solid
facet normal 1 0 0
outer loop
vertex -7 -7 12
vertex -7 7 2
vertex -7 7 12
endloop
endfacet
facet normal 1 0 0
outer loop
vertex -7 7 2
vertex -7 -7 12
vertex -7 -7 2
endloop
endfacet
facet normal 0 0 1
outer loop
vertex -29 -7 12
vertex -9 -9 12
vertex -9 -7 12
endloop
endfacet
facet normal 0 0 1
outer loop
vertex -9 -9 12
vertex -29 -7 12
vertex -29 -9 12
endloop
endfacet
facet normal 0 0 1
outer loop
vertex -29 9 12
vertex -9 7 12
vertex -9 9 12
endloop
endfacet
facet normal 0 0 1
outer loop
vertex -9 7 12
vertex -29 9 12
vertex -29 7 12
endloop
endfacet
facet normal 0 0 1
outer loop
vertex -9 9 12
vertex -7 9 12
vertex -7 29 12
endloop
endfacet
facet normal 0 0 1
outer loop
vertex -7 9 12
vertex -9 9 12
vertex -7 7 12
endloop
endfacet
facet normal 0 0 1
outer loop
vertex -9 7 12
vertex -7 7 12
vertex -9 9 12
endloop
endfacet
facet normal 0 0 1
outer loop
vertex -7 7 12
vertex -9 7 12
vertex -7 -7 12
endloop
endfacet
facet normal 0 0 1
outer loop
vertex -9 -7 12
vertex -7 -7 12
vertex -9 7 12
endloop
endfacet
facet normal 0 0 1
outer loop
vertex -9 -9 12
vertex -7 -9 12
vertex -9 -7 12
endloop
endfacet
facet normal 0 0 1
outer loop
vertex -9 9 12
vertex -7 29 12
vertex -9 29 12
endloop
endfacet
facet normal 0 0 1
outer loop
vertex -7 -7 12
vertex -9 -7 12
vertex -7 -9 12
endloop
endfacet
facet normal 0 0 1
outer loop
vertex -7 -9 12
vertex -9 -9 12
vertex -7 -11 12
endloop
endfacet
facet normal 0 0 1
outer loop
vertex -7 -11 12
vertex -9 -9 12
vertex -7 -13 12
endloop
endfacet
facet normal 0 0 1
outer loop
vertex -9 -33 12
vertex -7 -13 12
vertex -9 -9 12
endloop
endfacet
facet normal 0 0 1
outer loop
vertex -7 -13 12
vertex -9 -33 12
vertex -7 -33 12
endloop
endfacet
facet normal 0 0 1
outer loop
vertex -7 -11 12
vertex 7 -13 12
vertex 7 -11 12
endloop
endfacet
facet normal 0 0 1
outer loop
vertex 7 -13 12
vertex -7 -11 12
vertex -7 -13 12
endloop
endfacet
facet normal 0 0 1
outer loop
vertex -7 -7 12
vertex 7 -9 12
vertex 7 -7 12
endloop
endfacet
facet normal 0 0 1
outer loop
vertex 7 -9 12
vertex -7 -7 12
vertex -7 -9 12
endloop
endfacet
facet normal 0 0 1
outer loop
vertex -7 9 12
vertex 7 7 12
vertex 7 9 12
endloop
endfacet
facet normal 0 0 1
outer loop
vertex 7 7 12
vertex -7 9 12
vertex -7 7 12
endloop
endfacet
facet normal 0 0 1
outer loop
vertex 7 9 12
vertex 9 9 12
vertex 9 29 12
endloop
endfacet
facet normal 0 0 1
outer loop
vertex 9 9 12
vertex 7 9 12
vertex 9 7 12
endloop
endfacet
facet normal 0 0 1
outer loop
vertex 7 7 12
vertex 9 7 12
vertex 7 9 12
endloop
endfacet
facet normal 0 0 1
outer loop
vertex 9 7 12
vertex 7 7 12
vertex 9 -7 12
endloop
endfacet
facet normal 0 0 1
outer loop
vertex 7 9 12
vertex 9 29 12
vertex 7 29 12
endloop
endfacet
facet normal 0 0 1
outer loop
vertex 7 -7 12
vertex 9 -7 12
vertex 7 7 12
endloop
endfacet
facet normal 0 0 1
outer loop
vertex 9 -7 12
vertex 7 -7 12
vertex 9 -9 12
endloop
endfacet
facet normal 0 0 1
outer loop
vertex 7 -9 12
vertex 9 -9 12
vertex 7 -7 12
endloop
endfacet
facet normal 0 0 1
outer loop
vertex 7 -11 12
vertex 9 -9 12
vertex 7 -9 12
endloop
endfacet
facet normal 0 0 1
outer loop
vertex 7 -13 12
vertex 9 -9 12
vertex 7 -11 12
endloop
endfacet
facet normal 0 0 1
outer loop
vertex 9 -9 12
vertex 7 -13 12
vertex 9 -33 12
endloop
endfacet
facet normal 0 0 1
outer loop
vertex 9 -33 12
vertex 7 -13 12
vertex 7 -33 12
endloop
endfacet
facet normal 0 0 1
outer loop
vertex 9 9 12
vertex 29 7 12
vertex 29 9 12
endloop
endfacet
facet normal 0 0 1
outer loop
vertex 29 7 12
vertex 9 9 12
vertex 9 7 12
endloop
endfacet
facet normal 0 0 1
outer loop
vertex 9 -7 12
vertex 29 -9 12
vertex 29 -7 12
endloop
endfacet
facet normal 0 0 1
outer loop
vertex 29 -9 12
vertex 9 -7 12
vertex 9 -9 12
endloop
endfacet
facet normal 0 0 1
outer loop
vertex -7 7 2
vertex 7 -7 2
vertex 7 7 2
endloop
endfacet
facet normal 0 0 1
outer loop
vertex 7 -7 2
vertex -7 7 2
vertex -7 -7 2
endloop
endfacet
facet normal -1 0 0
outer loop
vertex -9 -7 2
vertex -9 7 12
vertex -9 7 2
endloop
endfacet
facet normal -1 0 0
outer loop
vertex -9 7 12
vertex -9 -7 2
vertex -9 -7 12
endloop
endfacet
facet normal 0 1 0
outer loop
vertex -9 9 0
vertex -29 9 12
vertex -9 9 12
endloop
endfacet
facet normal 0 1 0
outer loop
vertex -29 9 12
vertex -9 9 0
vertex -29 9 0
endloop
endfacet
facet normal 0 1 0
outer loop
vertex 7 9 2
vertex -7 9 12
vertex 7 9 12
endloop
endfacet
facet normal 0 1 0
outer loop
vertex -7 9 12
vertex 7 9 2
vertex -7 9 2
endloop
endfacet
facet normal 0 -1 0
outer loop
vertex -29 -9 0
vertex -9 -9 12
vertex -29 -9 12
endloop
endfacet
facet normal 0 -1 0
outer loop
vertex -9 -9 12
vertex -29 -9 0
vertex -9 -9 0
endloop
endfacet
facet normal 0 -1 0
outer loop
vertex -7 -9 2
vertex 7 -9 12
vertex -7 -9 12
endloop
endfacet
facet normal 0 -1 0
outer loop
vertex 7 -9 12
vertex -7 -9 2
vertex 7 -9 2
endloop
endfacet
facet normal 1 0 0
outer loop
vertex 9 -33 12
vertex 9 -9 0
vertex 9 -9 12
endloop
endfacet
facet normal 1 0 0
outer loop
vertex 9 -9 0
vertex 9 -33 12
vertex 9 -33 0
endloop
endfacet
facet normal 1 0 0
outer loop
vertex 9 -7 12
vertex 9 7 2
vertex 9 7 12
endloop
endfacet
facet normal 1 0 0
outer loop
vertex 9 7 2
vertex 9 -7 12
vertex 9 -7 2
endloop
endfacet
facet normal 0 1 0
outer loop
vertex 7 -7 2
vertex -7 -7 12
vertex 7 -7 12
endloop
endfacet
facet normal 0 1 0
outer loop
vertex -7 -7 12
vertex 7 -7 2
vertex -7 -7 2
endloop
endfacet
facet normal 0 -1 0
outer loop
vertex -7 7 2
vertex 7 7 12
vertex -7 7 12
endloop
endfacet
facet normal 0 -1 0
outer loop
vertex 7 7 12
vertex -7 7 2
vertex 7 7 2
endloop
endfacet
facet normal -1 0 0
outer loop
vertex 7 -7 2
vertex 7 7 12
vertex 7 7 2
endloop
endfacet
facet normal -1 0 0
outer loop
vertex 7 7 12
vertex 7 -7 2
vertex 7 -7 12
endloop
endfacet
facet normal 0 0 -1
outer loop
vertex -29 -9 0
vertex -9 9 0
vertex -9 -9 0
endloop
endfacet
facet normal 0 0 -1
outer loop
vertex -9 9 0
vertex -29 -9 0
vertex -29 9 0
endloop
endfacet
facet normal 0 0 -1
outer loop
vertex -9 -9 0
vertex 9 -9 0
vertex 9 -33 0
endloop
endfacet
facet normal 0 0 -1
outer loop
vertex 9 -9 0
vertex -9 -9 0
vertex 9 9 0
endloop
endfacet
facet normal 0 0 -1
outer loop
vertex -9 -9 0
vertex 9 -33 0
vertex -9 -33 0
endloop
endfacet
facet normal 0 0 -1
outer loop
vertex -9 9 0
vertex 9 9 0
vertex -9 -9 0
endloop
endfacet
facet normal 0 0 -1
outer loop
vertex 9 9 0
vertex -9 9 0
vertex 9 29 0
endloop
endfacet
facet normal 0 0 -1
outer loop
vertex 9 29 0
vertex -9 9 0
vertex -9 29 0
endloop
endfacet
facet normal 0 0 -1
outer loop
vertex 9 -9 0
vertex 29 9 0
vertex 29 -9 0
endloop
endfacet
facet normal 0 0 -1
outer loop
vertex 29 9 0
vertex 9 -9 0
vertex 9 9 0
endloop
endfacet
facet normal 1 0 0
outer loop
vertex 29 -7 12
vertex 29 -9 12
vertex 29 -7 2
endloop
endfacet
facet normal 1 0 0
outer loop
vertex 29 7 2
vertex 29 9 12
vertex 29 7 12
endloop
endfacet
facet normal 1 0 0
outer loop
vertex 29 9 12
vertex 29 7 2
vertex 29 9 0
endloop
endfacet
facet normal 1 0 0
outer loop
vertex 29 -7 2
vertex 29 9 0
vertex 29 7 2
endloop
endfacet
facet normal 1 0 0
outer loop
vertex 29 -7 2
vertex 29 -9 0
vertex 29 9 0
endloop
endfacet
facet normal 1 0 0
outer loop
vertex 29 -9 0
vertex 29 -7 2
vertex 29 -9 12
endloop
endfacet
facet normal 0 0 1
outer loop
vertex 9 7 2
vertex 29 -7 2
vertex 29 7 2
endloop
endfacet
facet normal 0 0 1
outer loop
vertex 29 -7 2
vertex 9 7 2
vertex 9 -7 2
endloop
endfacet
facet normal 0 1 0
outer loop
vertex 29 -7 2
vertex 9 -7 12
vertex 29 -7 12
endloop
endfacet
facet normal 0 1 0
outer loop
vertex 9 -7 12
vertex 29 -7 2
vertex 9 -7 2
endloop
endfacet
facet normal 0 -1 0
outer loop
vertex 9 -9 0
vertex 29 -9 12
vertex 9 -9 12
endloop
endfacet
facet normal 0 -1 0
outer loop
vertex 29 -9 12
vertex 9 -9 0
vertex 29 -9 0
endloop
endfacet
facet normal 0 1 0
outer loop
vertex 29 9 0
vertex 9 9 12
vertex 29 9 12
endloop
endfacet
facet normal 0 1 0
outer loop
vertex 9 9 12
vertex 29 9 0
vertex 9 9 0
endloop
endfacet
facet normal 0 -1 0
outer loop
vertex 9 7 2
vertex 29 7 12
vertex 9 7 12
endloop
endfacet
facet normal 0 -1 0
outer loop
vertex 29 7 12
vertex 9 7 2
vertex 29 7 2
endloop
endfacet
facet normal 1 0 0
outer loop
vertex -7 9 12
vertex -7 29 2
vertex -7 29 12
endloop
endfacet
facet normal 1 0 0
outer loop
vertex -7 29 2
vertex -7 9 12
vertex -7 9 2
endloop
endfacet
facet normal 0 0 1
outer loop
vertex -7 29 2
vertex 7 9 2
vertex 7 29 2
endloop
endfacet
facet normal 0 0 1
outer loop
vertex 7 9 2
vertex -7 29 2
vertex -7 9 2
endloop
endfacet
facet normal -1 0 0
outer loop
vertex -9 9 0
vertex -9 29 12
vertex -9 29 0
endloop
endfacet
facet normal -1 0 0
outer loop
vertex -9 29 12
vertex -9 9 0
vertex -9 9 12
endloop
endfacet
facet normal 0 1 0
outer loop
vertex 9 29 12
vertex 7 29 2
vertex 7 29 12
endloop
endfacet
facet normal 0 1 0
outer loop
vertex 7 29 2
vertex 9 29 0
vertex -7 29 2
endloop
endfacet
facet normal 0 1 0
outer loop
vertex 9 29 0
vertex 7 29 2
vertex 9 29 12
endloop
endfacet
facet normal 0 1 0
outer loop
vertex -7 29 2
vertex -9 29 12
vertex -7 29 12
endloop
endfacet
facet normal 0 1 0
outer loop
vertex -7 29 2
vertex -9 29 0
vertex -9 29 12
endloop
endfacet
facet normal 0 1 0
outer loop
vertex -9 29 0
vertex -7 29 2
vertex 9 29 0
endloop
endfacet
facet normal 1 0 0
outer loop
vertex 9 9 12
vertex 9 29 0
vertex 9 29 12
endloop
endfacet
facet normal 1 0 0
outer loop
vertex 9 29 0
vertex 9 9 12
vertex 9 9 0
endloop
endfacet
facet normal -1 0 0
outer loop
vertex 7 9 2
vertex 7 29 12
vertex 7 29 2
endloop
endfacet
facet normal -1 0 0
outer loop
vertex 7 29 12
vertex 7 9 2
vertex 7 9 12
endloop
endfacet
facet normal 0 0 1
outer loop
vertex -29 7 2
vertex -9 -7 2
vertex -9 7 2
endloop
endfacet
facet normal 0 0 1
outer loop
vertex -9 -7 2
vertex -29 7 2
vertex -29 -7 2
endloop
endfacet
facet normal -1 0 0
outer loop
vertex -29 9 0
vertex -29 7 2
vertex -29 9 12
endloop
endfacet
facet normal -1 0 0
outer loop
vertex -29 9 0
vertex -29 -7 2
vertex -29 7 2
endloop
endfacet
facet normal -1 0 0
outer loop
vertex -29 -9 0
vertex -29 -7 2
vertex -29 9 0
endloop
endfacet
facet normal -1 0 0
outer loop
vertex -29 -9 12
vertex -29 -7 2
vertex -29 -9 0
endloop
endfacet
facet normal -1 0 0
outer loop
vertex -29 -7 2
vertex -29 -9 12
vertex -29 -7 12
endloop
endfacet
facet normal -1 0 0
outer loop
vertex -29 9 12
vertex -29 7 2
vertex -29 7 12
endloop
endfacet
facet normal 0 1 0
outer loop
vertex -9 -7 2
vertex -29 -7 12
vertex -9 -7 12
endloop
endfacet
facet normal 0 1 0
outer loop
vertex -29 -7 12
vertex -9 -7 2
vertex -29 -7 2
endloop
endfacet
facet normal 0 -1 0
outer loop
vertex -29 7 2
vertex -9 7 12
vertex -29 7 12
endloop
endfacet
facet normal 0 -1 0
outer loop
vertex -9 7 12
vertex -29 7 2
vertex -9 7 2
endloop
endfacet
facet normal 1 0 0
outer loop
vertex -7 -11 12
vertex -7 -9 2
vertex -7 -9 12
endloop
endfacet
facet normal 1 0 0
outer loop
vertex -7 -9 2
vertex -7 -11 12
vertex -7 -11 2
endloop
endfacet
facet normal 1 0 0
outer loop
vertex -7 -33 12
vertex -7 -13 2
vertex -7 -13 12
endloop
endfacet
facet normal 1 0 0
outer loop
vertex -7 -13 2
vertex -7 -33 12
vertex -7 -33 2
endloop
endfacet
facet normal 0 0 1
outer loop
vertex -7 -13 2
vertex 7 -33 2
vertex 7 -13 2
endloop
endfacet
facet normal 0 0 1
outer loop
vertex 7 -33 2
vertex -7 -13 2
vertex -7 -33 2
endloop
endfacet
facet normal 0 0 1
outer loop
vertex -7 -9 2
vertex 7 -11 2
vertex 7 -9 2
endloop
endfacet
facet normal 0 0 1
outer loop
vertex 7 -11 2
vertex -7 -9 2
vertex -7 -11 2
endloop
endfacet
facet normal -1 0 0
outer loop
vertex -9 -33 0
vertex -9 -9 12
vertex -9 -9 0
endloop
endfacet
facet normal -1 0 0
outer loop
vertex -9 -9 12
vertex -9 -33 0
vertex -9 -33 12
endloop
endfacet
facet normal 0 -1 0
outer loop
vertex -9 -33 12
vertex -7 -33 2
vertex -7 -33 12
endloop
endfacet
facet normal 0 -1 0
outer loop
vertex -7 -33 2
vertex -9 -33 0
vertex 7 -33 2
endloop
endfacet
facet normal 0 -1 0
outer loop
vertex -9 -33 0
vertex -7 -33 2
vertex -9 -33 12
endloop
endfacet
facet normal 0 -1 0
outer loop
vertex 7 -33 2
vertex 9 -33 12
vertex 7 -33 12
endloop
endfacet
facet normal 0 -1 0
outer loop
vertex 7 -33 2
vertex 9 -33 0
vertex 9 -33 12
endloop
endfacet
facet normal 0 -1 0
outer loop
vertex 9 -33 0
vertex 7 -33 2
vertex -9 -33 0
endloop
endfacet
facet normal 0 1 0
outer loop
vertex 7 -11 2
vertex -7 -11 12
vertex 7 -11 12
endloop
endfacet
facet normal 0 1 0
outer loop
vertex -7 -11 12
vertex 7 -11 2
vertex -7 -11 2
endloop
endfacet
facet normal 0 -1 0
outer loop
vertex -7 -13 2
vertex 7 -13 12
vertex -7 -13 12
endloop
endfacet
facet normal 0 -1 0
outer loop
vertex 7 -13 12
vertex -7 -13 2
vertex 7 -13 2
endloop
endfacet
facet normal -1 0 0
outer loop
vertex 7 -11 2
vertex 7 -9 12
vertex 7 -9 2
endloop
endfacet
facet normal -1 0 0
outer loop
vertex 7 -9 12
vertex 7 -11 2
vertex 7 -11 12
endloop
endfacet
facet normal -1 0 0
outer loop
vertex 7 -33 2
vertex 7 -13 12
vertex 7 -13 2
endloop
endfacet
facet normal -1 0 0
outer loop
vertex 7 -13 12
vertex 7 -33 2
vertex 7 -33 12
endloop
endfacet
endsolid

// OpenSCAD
thickness=2;
width=14;
padding=0;
height=10;
extrusion=20;
gap=4;

m_padding=padding;
t_width=width;
t_padding=padding;
b_width=width;
b_padding=padding;

//m_padding=6;
//t_width=10;
//t_padding=6;
//b_width=width;
//b_padding=6;

r_do = true;
t_do = true;
l_do = true;
b_do = true;


align=(width+2*thickness)/2;

t_align=(t_width+2*thickness)/2;
b_align=(b_width+2*thickness)/2;

// MIDDLE
translate([-align,-align, 0]) {
    cube([width+2*thickness,width+2*thickness,thickness+m_padding]);

    translate([0,0,thickness]) {
        cube([thickness, width+2*thickness, height+m_padding]);

        cube([width+2*thickness, thickness, height+m_padding]);

        translate([0,width+thickness,0])
        cube([width+2*thickness, thickness, height+m_padding]);

        translate([width+thickness,0,0])
        cube([thickness, width+2*thickness, height+m_padding]);
    }
};

// RIGHT
if (r_do)
translate([width+2*thickness-align,0-align,0])
union() {
    cube([extrusion,width+2*thickness,thickness+padding]);
    translate([0,0,thickness]) {
        cube([extrusion, thickness, height+padding]);

        translate([0,width+thickness,0])
        cube([extrusion, thickness, height+padding]);
    }
}

// TOP
if (t_do)
translate([0-t_align,width+2*thickness-align,0])
union() {
    cube([t_width+2*thickness,extrusion,thickness+t_padding]);
    translate([0,0,thickness]) {
        cube([thickness, extrusion, height+t_padding]);

        translate([t_width+thickness,0,0])
        cube([thickness, extrusion, height+t_padding]);
    }
}

// LEFT
if (l_do)
translate([-extrusion-align,0-align,0])
union() {
    cube([extrusion,width+2*thickness,thickness+padding]);
    translate([0,0,thickness]) {

        cube([extrusion, thickness, height+padding]);

        translate([0,width+thickness,0])
        cube([extrusion, thickness, height+padding]);
    }
}

// BOTTOM
if (b_do)
translate([0-b_align,-extrusion-gap-align,0])
union() {
    cube([b_width+2*thickness,extrusion+gap,thickness+b_padding]);
    translate([0,0,thickness]) {
        cube([thickness, extrusion+gap, height+b_padding]);

        translate([0,extrusion,0])
        cube([b_width+2*thickness, thickness, height+b_padding]);

        translate([b_width+thickness,0,0])
        cube([thickness, extrusion+gap, height+b_padding]);
    }
}
